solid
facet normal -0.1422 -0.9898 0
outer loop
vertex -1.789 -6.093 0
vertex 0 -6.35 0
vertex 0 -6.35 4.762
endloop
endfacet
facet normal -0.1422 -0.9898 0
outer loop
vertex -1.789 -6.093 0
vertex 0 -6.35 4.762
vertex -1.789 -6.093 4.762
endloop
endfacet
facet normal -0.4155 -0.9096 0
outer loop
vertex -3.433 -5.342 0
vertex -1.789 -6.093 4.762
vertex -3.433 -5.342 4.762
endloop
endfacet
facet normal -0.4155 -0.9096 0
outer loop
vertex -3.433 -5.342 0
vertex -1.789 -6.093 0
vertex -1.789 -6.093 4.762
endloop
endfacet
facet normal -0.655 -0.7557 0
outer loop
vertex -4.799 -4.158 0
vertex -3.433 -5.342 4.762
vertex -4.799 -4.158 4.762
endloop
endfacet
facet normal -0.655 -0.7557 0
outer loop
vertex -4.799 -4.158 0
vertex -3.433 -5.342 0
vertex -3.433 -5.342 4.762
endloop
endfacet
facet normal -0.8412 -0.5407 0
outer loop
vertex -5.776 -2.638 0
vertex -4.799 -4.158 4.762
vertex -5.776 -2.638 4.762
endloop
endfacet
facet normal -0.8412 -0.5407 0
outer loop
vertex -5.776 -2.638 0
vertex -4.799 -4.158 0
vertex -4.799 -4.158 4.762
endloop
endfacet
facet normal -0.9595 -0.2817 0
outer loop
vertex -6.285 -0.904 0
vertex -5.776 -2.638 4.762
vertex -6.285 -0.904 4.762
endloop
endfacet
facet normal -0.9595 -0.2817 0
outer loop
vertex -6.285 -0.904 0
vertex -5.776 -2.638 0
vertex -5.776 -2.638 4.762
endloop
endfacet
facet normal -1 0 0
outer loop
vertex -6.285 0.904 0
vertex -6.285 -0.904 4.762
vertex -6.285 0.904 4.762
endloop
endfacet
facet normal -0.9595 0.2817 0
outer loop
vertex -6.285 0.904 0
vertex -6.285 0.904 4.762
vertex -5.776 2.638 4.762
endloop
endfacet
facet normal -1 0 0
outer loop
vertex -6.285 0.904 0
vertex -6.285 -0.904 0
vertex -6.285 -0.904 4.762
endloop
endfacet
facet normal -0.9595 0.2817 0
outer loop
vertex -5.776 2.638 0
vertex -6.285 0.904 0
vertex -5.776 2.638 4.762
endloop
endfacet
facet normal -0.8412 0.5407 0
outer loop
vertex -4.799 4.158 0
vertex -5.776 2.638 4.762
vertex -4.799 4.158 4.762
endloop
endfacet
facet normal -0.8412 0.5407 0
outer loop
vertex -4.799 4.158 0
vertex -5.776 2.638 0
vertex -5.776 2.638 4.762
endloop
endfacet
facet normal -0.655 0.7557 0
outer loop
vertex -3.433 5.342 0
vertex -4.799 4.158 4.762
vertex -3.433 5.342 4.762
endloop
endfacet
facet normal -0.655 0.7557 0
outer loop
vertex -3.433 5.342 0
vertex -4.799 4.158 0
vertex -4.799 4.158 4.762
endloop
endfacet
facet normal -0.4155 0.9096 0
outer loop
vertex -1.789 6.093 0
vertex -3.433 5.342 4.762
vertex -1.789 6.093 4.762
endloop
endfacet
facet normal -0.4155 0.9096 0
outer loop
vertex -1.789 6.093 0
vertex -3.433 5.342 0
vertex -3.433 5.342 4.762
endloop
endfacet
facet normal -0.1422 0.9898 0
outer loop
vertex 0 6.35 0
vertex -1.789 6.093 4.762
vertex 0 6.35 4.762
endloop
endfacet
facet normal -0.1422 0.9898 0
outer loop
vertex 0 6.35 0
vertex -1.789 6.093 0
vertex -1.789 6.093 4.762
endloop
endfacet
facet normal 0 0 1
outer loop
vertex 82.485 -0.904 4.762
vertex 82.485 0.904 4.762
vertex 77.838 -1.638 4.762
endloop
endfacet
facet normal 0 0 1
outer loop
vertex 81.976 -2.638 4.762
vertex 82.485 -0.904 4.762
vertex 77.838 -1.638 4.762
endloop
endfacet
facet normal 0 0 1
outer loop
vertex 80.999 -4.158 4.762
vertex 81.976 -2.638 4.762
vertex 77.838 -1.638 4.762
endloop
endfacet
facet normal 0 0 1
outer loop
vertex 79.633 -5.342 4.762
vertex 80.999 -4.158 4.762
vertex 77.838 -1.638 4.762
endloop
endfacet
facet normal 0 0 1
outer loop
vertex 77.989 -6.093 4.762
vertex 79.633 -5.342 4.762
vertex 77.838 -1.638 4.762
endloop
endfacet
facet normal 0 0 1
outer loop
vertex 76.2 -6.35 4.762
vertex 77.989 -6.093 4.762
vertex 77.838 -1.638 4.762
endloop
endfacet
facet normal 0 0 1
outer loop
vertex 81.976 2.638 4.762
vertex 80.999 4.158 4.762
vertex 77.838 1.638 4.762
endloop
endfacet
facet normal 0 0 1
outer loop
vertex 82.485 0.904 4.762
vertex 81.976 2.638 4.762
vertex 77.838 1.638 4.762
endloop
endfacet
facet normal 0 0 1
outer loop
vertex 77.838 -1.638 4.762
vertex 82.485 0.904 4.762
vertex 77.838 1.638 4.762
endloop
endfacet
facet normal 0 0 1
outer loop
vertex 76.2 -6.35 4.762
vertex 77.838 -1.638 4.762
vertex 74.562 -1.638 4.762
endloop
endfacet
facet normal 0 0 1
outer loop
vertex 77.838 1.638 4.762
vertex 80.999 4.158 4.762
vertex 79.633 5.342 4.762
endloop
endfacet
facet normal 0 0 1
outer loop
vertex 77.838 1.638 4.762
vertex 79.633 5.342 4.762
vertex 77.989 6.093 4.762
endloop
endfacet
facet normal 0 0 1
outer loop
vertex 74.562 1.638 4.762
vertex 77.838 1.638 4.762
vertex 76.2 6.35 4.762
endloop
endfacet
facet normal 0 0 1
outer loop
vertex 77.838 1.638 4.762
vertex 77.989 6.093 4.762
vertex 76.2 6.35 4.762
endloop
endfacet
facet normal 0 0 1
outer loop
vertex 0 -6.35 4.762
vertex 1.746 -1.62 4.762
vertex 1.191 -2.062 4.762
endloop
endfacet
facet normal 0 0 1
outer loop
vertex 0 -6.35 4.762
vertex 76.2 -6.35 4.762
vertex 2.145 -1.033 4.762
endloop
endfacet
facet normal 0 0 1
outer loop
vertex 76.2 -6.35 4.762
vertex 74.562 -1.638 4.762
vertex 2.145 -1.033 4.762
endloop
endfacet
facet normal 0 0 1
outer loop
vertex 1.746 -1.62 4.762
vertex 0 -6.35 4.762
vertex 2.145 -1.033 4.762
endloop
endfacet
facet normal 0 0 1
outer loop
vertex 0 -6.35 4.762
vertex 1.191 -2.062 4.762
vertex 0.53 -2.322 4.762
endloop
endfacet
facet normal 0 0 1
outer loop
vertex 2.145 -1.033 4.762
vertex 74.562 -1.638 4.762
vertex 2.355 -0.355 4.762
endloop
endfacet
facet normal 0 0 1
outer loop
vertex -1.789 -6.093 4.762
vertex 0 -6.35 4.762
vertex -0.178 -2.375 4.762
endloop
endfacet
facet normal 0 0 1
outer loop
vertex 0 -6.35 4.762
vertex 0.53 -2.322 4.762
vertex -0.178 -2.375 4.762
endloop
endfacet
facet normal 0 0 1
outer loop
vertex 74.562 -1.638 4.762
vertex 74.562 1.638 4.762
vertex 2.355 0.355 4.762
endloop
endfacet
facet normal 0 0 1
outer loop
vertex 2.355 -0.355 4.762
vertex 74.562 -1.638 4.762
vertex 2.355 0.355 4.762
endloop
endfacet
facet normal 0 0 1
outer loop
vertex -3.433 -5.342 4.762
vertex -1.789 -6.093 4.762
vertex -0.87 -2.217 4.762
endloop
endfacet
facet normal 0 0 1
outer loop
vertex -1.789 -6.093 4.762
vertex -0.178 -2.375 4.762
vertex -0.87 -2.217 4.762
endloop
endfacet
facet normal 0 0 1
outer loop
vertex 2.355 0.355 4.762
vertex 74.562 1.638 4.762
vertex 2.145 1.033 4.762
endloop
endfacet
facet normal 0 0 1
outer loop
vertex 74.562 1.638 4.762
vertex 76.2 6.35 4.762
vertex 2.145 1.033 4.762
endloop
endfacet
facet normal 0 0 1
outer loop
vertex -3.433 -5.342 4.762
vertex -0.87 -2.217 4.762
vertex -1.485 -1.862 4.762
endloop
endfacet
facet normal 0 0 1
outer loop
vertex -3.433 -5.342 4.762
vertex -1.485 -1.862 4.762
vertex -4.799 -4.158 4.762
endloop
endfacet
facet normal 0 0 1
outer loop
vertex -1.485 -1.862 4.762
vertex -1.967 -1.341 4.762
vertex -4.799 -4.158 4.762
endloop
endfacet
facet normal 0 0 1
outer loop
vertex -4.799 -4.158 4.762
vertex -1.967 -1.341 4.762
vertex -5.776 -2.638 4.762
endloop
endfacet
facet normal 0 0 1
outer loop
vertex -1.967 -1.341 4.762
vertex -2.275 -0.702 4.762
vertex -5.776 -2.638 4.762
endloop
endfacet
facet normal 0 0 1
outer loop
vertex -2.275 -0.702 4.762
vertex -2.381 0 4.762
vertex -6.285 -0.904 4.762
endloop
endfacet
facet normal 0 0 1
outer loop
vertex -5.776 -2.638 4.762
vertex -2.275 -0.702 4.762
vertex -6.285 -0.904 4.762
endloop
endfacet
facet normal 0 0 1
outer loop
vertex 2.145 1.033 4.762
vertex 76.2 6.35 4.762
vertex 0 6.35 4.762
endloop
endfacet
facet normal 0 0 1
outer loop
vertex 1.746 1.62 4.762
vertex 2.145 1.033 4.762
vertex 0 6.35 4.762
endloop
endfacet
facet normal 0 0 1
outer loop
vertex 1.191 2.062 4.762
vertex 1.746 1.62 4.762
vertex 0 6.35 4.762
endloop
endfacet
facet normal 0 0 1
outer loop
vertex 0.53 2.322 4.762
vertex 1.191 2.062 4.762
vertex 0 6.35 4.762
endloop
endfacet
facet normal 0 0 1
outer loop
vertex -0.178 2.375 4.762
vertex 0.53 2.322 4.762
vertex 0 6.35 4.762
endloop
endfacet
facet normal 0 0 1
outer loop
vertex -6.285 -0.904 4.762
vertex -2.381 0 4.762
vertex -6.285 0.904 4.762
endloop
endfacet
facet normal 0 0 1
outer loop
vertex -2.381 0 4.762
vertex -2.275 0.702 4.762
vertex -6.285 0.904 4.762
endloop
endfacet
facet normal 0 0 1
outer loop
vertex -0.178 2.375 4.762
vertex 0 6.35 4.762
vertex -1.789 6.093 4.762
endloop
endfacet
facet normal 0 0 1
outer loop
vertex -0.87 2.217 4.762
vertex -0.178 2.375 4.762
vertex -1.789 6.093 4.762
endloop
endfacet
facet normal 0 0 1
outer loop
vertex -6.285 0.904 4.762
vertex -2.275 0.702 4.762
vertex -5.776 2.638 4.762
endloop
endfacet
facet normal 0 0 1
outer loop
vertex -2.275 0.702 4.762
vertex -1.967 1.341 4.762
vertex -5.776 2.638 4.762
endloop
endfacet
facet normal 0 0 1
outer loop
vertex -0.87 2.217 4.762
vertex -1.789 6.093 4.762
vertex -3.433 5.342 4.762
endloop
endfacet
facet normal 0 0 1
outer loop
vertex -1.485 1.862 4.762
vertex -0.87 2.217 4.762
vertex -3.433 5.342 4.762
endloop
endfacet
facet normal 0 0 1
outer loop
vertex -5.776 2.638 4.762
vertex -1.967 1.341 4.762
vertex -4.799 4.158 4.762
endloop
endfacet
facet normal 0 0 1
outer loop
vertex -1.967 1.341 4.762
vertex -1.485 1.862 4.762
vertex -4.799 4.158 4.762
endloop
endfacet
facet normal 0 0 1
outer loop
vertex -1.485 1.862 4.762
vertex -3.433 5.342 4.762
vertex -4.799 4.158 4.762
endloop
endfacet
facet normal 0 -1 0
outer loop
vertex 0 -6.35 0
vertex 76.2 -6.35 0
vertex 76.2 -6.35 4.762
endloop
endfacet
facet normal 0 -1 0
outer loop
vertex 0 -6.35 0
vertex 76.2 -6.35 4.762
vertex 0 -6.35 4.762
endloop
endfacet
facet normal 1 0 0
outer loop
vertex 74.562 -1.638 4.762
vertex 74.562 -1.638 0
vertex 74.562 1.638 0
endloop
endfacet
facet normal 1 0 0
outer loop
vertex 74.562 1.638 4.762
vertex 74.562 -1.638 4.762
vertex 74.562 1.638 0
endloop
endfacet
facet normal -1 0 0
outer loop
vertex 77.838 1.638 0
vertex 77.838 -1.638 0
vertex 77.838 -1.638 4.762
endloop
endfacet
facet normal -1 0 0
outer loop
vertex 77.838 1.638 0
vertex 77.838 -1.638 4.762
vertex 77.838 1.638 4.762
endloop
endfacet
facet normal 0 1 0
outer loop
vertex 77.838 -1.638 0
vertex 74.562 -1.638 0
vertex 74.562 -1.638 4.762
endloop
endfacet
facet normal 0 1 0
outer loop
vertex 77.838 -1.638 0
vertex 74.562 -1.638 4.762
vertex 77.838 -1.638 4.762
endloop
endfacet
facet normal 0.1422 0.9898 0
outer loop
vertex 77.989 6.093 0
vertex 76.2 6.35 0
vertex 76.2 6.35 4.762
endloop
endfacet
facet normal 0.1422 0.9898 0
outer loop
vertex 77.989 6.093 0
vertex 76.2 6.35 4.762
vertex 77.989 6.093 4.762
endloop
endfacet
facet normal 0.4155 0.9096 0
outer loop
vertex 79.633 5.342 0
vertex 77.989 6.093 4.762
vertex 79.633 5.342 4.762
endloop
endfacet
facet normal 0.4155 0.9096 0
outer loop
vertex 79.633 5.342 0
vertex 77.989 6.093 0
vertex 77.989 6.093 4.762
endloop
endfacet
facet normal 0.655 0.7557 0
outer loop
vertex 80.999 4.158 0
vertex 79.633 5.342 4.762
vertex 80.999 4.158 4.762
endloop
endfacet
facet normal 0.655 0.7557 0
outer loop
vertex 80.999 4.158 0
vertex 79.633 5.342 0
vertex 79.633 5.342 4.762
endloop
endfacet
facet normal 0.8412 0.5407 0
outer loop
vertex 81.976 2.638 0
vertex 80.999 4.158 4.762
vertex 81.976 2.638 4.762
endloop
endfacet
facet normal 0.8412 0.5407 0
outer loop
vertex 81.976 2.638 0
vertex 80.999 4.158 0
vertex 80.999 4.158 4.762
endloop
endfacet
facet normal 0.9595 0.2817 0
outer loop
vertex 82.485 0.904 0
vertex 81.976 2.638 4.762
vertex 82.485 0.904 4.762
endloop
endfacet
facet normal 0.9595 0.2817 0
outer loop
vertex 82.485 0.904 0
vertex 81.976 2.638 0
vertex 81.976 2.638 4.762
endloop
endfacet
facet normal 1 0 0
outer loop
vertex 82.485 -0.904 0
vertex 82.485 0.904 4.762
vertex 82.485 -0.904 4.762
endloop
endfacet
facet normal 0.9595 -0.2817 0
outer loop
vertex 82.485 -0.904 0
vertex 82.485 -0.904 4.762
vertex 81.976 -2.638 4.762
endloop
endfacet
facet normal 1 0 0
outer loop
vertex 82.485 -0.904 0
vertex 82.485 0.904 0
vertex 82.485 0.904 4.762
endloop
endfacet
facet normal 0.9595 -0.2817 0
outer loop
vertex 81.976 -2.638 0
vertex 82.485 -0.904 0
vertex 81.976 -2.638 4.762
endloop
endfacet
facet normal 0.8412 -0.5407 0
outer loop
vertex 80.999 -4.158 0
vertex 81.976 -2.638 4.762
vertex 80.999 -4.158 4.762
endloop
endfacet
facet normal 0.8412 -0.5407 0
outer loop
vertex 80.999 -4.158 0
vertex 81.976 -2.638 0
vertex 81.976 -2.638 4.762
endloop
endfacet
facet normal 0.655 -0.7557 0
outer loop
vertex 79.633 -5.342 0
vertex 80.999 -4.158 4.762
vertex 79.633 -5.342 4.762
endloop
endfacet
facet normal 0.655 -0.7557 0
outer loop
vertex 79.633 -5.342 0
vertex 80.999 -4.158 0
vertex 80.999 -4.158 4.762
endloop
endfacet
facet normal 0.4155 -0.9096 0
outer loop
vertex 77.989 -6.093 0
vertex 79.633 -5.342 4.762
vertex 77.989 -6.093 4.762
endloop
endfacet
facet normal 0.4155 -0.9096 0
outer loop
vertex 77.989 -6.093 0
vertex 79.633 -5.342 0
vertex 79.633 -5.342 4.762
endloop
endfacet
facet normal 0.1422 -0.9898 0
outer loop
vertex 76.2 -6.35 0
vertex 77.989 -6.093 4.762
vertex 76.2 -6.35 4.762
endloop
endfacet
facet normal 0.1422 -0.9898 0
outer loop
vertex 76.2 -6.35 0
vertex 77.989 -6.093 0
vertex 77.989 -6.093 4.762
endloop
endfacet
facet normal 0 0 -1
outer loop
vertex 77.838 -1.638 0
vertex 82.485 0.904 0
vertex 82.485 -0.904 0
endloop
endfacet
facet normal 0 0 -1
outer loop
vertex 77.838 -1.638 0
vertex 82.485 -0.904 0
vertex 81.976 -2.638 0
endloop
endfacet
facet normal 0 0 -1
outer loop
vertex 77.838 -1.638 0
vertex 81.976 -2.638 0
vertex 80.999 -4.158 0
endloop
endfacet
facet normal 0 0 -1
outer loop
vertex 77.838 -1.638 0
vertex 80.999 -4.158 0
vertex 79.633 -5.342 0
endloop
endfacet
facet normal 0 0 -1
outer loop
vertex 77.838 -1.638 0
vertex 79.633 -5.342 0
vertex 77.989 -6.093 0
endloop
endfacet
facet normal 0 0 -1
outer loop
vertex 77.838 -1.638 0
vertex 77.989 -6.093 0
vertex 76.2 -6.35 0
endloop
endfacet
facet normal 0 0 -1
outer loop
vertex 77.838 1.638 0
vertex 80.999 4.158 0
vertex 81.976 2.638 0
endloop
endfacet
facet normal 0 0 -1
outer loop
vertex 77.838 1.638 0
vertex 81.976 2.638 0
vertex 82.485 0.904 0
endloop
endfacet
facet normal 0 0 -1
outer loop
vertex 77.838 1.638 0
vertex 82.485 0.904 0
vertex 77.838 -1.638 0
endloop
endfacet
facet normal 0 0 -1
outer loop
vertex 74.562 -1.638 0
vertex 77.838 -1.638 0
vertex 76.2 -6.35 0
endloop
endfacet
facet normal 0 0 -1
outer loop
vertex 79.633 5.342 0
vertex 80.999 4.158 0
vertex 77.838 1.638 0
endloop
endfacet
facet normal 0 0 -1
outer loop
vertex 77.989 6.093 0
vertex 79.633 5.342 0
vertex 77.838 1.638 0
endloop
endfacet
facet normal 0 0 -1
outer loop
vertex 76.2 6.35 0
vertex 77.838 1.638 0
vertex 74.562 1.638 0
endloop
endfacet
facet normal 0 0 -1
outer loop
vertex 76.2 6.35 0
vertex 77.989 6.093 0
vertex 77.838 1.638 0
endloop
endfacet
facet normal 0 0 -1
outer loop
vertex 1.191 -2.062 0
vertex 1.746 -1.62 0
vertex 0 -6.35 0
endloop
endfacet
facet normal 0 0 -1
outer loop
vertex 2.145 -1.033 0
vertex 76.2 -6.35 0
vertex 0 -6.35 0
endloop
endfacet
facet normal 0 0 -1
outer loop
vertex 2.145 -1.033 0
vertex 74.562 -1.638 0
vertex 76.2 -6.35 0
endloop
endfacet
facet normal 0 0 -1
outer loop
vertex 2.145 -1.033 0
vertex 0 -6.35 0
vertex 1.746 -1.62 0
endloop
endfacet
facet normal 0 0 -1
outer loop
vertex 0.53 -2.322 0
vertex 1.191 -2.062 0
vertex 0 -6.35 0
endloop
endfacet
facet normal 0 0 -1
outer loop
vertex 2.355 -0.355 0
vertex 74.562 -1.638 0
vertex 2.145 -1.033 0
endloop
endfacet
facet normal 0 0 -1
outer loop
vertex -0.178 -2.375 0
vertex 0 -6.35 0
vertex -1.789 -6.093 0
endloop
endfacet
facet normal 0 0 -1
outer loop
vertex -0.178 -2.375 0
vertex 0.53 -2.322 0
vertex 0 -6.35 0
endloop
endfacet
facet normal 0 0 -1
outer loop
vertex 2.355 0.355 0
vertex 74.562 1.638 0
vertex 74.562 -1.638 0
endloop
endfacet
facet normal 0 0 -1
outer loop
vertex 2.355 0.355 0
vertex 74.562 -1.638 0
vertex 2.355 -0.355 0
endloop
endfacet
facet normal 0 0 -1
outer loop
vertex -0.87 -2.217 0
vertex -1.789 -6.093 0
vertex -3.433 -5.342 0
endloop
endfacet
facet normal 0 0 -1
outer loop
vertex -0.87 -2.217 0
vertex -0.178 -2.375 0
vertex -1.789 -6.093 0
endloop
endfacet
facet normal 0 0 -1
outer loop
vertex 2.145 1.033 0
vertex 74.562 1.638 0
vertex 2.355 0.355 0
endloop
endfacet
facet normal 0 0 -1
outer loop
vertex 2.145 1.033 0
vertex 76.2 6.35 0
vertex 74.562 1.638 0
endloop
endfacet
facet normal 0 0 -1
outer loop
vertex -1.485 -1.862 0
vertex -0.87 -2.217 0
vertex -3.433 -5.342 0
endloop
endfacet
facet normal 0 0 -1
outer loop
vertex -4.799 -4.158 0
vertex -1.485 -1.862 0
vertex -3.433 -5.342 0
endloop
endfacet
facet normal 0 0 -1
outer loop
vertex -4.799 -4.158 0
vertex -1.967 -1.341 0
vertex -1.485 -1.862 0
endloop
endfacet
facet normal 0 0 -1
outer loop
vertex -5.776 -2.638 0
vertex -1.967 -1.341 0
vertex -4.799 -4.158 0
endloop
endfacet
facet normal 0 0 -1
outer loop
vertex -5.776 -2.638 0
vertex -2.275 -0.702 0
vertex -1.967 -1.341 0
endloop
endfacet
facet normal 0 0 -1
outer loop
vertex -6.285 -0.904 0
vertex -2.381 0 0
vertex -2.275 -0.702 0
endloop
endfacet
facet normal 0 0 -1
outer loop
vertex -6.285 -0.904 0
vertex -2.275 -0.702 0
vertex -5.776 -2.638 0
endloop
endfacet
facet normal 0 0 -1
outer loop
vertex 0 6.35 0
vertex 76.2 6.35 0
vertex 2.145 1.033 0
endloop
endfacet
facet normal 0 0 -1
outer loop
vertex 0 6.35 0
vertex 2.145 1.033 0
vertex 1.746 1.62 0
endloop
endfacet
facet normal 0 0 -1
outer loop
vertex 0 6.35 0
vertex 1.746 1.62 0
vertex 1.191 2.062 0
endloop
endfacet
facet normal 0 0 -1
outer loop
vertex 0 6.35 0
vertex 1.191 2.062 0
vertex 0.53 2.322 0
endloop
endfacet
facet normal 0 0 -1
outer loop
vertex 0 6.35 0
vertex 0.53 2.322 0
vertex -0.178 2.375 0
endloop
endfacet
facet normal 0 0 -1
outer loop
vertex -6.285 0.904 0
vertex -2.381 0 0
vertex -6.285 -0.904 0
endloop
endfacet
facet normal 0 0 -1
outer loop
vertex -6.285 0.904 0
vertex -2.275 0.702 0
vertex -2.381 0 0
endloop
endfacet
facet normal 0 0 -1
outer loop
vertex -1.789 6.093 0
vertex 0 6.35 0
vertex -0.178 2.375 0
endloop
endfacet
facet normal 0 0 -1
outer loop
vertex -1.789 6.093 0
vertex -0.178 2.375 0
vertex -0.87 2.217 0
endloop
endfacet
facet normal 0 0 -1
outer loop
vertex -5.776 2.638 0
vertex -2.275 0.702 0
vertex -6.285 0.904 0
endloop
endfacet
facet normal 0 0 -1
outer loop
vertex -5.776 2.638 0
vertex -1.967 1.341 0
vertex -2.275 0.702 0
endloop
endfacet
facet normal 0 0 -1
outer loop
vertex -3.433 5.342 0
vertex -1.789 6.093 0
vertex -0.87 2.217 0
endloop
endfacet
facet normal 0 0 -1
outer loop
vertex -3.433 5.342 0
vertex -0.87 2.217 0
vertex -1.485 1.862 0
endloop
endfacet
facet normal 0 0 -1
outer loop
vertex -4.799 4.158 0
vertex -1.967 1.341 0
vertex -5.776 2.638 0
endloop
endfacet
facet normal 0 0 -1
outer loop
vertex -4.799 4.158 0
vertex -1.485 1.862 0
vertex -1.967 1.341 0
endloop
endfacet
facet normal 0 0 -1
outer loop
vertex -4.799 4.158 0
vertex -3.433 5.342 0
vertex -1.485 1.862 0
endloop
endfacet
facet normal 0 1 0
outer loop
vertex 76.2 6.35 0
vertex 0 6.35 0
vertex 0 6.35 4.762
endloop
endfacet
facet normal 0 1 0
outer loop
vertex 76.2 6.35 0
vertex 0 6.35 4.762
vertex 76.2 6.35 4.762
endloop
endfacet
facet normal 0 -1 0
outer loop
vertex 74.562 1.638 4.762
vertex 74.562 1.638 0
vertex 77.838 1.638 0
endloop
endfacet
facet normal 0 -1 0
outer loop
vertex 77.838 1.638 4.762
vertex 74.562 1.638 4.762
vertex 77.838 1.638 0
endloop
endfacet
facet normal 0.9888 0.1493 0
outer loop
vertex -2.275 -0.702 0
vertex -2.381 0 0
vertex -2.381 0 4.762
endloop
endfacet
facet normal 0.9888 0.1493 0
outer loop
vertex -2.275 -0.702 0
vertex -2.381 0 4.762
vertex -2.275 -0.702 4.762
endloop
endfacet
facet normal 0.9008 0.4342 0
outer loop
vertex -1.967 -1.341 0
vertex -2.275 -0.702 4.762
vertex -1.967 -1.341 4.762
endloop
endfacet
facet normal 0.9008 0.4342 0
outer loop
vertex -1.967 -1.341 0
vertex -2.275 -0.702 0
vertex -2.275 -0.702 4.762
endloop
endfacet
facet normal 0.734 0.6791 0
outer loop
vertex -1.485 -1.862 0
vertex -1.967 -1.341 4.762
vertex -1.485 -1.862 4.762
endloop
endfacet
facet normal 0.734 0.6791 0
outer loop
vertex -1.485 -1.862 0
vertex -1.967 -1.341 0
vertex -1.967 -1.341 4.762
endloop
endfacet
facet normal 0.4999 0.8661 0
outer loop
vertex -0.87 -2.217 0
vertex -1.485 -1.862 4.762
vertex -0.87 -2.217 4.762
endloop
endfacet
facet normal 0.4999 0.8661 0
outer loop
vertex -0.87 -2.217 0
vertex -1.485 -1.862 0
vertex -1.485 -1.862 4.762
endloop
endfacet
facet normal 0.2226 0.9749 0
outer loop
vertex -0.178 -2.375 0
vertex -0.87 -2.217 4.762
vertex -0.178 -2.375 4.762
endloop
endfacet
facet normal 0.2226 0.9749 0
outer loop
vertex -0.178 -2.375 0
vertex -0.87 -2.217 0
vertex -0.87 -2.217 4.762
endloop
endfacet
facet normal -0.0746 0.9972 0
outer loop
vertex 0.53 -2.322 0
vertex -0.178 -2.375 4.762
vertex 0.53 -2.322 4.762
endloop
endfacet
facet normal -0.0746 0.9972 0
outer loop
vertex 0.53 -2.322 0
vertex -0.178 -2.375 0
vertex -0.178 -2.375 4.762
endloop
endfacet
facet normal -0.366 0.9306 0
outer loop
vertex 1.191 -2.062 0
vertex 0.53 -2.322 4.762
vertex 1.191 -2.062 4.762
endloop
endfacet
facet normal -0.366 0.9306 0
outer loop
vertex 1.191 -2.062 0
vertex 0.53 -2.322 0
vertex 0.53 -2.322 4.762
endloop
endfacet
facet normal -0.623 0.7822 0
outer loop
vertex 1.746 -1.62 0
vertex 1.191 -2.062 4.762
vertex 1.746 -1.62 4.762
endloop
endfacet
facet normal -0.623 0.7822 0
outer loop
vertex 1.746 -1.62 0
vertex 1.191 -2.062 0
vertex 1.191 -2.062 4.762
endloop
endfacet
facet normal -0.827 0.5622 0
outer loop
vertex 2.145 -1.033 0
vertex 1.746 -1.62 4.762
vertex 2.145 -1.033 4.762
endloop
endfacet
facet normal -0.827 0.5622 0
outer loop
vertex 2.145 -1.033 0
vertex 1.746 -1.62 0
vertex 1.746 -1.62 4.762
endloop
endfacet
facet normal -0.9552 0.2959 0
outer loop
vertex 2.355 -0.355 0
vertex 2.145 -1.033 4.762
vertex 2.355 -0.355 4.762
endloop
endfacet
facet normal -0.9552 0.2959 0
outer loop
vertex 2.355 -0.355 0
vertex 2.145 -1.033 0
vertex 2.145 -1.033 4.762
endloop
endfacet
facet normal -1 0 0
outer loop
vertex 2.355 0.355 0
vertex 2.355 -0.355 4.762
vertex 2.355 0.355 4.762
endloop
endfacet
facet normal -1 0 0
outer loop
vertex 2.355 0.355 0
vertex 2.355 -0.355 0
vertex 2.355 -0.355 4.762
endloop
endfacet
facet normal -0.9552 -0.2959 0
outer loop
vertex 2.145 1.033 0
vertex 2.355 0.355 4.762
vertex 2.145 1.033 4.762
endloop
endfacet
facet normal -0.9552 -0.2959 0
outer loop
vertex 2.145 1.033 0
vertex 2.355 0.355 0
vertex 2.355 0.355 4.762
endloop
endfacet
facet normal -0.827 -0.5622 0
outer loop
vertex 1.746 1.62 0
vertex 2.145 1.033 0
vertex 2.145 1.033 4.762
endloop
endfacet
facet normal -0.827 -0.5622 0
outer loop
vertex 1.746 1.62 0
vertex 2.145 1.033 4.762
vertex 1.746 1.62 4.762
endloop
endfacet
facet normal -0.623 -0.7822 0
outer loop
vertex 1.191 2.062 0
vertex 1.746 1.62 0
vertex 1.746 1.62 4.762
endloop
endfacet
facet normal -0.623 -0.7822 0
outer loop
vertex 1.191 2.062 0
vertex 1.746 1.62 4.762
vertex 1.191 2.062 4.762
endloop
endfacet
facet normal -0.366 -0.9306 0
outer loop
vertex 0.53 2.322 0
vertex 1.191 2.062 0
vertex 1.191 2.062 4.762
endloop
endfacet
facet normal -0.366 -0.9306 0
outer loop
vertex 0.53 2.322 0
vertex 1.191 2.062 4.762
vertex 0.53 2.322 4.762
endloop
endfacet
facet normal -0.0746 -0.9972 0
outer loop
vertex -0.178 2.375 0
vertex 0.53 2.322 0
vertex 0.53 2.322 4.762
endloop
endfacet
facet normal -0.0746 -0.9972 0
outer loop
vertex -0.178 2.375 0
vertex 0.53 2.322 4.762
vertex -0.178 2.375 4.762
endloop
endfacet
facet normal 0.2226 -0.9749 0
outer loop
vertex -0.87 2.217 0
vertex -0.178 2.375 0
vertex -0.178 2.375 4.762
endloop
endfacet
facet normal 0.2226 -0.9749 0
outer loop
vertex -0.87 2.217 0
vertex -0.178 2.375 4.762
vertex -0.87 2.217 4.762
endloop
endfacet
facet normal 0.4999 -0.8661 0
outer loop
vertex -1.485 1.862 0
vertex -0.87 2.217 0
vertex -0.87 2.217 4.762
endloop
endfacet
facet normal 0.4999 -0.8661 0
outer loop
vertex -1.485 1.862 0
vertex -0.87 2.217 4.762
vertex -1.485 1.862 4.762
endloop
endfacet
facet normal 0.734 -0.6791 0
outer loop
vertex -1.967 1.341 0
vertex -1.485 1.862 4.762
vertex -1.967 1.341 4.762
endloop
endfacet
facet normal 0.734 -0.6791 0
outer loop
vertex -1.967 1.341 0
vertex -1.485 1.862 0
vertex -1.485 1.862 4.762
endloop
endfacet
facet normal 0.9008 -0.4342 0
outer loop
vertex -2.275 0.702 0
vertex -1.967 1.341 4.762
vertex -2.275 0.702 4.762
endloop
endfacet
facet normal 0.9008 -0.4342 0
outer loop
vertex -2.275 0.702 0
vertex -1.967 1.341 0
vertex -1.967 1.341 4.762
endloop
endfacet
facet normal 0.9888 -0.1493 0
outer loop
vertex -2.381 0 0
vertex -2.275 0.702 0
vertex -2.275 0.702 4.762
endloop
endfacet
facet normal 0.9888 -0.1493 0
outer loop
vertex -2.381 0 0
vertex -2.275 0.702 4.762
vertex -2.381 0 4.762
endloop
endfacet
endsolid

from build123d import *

# Parameters (mm, degrees)
SKETCH1_R           = 2.38125
SKETCH1_W           = 3.2766
SKETCH1_H           = 3.2766
BOSS_EXTRUDE1_DEPTH = 4.7625


with BuildPart() as part:
    # Sketch1 → Boss-Extrude1 (new body)
    with BuildSketch(Plane.XY):
        with BuildLine():
            Line((0, 6.35), (76.2, 6.35))
            ThreePointArc((76.2, 6.35), (82.55, 0), (76.2, -6.35))
            Line((76.2, -6.35), (0, -6.35))
            ThreePointArc((0, -6.35), (-6.35, 0), (0, 6.35))
        make_face()
        with Locations(Location((0, 0, 0), (0, 0, 180))):
            Circle(SKETCH1_R, mode=Mode.SUBTRACT)
        with Locations((76.2, 0)):
            Rectangle(SKETCH1_W, SKETCH1_H, mode=Mode.SUBTRACT)
    extrude(amount=BOSS_EXTRUDE1_DEPTH)


solid = part.part
